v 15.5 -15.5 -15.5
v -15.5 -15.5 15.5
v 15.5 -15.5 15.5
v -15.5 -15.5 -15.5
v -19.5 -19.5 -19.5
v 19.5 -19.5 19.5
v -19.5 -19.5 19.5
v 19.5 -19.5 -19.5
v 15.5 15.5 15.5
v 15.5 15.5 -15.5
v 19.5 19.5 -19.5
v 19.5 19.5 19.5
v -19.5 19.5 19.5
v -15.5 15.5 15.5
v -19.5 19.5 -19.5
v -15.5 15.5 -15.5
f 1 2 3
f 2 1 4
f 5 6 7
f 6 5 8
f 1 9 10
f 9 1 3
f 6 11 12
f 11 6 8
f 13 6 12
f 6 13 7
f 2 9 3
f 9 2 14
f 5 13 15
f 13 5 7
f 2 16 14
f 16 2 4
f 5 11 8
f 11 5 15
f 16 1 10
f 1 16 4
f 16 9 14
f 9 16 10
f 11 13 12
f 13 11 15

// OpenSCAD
include <../box.scad>

size = 4*3.5 + 25 + 30 * sin($t * 360);
translate([-size/2, -size/2, -size/2])
box(width =  size,
    height = size,
    depth =  size, thickness = 4,
    assemble = true);
